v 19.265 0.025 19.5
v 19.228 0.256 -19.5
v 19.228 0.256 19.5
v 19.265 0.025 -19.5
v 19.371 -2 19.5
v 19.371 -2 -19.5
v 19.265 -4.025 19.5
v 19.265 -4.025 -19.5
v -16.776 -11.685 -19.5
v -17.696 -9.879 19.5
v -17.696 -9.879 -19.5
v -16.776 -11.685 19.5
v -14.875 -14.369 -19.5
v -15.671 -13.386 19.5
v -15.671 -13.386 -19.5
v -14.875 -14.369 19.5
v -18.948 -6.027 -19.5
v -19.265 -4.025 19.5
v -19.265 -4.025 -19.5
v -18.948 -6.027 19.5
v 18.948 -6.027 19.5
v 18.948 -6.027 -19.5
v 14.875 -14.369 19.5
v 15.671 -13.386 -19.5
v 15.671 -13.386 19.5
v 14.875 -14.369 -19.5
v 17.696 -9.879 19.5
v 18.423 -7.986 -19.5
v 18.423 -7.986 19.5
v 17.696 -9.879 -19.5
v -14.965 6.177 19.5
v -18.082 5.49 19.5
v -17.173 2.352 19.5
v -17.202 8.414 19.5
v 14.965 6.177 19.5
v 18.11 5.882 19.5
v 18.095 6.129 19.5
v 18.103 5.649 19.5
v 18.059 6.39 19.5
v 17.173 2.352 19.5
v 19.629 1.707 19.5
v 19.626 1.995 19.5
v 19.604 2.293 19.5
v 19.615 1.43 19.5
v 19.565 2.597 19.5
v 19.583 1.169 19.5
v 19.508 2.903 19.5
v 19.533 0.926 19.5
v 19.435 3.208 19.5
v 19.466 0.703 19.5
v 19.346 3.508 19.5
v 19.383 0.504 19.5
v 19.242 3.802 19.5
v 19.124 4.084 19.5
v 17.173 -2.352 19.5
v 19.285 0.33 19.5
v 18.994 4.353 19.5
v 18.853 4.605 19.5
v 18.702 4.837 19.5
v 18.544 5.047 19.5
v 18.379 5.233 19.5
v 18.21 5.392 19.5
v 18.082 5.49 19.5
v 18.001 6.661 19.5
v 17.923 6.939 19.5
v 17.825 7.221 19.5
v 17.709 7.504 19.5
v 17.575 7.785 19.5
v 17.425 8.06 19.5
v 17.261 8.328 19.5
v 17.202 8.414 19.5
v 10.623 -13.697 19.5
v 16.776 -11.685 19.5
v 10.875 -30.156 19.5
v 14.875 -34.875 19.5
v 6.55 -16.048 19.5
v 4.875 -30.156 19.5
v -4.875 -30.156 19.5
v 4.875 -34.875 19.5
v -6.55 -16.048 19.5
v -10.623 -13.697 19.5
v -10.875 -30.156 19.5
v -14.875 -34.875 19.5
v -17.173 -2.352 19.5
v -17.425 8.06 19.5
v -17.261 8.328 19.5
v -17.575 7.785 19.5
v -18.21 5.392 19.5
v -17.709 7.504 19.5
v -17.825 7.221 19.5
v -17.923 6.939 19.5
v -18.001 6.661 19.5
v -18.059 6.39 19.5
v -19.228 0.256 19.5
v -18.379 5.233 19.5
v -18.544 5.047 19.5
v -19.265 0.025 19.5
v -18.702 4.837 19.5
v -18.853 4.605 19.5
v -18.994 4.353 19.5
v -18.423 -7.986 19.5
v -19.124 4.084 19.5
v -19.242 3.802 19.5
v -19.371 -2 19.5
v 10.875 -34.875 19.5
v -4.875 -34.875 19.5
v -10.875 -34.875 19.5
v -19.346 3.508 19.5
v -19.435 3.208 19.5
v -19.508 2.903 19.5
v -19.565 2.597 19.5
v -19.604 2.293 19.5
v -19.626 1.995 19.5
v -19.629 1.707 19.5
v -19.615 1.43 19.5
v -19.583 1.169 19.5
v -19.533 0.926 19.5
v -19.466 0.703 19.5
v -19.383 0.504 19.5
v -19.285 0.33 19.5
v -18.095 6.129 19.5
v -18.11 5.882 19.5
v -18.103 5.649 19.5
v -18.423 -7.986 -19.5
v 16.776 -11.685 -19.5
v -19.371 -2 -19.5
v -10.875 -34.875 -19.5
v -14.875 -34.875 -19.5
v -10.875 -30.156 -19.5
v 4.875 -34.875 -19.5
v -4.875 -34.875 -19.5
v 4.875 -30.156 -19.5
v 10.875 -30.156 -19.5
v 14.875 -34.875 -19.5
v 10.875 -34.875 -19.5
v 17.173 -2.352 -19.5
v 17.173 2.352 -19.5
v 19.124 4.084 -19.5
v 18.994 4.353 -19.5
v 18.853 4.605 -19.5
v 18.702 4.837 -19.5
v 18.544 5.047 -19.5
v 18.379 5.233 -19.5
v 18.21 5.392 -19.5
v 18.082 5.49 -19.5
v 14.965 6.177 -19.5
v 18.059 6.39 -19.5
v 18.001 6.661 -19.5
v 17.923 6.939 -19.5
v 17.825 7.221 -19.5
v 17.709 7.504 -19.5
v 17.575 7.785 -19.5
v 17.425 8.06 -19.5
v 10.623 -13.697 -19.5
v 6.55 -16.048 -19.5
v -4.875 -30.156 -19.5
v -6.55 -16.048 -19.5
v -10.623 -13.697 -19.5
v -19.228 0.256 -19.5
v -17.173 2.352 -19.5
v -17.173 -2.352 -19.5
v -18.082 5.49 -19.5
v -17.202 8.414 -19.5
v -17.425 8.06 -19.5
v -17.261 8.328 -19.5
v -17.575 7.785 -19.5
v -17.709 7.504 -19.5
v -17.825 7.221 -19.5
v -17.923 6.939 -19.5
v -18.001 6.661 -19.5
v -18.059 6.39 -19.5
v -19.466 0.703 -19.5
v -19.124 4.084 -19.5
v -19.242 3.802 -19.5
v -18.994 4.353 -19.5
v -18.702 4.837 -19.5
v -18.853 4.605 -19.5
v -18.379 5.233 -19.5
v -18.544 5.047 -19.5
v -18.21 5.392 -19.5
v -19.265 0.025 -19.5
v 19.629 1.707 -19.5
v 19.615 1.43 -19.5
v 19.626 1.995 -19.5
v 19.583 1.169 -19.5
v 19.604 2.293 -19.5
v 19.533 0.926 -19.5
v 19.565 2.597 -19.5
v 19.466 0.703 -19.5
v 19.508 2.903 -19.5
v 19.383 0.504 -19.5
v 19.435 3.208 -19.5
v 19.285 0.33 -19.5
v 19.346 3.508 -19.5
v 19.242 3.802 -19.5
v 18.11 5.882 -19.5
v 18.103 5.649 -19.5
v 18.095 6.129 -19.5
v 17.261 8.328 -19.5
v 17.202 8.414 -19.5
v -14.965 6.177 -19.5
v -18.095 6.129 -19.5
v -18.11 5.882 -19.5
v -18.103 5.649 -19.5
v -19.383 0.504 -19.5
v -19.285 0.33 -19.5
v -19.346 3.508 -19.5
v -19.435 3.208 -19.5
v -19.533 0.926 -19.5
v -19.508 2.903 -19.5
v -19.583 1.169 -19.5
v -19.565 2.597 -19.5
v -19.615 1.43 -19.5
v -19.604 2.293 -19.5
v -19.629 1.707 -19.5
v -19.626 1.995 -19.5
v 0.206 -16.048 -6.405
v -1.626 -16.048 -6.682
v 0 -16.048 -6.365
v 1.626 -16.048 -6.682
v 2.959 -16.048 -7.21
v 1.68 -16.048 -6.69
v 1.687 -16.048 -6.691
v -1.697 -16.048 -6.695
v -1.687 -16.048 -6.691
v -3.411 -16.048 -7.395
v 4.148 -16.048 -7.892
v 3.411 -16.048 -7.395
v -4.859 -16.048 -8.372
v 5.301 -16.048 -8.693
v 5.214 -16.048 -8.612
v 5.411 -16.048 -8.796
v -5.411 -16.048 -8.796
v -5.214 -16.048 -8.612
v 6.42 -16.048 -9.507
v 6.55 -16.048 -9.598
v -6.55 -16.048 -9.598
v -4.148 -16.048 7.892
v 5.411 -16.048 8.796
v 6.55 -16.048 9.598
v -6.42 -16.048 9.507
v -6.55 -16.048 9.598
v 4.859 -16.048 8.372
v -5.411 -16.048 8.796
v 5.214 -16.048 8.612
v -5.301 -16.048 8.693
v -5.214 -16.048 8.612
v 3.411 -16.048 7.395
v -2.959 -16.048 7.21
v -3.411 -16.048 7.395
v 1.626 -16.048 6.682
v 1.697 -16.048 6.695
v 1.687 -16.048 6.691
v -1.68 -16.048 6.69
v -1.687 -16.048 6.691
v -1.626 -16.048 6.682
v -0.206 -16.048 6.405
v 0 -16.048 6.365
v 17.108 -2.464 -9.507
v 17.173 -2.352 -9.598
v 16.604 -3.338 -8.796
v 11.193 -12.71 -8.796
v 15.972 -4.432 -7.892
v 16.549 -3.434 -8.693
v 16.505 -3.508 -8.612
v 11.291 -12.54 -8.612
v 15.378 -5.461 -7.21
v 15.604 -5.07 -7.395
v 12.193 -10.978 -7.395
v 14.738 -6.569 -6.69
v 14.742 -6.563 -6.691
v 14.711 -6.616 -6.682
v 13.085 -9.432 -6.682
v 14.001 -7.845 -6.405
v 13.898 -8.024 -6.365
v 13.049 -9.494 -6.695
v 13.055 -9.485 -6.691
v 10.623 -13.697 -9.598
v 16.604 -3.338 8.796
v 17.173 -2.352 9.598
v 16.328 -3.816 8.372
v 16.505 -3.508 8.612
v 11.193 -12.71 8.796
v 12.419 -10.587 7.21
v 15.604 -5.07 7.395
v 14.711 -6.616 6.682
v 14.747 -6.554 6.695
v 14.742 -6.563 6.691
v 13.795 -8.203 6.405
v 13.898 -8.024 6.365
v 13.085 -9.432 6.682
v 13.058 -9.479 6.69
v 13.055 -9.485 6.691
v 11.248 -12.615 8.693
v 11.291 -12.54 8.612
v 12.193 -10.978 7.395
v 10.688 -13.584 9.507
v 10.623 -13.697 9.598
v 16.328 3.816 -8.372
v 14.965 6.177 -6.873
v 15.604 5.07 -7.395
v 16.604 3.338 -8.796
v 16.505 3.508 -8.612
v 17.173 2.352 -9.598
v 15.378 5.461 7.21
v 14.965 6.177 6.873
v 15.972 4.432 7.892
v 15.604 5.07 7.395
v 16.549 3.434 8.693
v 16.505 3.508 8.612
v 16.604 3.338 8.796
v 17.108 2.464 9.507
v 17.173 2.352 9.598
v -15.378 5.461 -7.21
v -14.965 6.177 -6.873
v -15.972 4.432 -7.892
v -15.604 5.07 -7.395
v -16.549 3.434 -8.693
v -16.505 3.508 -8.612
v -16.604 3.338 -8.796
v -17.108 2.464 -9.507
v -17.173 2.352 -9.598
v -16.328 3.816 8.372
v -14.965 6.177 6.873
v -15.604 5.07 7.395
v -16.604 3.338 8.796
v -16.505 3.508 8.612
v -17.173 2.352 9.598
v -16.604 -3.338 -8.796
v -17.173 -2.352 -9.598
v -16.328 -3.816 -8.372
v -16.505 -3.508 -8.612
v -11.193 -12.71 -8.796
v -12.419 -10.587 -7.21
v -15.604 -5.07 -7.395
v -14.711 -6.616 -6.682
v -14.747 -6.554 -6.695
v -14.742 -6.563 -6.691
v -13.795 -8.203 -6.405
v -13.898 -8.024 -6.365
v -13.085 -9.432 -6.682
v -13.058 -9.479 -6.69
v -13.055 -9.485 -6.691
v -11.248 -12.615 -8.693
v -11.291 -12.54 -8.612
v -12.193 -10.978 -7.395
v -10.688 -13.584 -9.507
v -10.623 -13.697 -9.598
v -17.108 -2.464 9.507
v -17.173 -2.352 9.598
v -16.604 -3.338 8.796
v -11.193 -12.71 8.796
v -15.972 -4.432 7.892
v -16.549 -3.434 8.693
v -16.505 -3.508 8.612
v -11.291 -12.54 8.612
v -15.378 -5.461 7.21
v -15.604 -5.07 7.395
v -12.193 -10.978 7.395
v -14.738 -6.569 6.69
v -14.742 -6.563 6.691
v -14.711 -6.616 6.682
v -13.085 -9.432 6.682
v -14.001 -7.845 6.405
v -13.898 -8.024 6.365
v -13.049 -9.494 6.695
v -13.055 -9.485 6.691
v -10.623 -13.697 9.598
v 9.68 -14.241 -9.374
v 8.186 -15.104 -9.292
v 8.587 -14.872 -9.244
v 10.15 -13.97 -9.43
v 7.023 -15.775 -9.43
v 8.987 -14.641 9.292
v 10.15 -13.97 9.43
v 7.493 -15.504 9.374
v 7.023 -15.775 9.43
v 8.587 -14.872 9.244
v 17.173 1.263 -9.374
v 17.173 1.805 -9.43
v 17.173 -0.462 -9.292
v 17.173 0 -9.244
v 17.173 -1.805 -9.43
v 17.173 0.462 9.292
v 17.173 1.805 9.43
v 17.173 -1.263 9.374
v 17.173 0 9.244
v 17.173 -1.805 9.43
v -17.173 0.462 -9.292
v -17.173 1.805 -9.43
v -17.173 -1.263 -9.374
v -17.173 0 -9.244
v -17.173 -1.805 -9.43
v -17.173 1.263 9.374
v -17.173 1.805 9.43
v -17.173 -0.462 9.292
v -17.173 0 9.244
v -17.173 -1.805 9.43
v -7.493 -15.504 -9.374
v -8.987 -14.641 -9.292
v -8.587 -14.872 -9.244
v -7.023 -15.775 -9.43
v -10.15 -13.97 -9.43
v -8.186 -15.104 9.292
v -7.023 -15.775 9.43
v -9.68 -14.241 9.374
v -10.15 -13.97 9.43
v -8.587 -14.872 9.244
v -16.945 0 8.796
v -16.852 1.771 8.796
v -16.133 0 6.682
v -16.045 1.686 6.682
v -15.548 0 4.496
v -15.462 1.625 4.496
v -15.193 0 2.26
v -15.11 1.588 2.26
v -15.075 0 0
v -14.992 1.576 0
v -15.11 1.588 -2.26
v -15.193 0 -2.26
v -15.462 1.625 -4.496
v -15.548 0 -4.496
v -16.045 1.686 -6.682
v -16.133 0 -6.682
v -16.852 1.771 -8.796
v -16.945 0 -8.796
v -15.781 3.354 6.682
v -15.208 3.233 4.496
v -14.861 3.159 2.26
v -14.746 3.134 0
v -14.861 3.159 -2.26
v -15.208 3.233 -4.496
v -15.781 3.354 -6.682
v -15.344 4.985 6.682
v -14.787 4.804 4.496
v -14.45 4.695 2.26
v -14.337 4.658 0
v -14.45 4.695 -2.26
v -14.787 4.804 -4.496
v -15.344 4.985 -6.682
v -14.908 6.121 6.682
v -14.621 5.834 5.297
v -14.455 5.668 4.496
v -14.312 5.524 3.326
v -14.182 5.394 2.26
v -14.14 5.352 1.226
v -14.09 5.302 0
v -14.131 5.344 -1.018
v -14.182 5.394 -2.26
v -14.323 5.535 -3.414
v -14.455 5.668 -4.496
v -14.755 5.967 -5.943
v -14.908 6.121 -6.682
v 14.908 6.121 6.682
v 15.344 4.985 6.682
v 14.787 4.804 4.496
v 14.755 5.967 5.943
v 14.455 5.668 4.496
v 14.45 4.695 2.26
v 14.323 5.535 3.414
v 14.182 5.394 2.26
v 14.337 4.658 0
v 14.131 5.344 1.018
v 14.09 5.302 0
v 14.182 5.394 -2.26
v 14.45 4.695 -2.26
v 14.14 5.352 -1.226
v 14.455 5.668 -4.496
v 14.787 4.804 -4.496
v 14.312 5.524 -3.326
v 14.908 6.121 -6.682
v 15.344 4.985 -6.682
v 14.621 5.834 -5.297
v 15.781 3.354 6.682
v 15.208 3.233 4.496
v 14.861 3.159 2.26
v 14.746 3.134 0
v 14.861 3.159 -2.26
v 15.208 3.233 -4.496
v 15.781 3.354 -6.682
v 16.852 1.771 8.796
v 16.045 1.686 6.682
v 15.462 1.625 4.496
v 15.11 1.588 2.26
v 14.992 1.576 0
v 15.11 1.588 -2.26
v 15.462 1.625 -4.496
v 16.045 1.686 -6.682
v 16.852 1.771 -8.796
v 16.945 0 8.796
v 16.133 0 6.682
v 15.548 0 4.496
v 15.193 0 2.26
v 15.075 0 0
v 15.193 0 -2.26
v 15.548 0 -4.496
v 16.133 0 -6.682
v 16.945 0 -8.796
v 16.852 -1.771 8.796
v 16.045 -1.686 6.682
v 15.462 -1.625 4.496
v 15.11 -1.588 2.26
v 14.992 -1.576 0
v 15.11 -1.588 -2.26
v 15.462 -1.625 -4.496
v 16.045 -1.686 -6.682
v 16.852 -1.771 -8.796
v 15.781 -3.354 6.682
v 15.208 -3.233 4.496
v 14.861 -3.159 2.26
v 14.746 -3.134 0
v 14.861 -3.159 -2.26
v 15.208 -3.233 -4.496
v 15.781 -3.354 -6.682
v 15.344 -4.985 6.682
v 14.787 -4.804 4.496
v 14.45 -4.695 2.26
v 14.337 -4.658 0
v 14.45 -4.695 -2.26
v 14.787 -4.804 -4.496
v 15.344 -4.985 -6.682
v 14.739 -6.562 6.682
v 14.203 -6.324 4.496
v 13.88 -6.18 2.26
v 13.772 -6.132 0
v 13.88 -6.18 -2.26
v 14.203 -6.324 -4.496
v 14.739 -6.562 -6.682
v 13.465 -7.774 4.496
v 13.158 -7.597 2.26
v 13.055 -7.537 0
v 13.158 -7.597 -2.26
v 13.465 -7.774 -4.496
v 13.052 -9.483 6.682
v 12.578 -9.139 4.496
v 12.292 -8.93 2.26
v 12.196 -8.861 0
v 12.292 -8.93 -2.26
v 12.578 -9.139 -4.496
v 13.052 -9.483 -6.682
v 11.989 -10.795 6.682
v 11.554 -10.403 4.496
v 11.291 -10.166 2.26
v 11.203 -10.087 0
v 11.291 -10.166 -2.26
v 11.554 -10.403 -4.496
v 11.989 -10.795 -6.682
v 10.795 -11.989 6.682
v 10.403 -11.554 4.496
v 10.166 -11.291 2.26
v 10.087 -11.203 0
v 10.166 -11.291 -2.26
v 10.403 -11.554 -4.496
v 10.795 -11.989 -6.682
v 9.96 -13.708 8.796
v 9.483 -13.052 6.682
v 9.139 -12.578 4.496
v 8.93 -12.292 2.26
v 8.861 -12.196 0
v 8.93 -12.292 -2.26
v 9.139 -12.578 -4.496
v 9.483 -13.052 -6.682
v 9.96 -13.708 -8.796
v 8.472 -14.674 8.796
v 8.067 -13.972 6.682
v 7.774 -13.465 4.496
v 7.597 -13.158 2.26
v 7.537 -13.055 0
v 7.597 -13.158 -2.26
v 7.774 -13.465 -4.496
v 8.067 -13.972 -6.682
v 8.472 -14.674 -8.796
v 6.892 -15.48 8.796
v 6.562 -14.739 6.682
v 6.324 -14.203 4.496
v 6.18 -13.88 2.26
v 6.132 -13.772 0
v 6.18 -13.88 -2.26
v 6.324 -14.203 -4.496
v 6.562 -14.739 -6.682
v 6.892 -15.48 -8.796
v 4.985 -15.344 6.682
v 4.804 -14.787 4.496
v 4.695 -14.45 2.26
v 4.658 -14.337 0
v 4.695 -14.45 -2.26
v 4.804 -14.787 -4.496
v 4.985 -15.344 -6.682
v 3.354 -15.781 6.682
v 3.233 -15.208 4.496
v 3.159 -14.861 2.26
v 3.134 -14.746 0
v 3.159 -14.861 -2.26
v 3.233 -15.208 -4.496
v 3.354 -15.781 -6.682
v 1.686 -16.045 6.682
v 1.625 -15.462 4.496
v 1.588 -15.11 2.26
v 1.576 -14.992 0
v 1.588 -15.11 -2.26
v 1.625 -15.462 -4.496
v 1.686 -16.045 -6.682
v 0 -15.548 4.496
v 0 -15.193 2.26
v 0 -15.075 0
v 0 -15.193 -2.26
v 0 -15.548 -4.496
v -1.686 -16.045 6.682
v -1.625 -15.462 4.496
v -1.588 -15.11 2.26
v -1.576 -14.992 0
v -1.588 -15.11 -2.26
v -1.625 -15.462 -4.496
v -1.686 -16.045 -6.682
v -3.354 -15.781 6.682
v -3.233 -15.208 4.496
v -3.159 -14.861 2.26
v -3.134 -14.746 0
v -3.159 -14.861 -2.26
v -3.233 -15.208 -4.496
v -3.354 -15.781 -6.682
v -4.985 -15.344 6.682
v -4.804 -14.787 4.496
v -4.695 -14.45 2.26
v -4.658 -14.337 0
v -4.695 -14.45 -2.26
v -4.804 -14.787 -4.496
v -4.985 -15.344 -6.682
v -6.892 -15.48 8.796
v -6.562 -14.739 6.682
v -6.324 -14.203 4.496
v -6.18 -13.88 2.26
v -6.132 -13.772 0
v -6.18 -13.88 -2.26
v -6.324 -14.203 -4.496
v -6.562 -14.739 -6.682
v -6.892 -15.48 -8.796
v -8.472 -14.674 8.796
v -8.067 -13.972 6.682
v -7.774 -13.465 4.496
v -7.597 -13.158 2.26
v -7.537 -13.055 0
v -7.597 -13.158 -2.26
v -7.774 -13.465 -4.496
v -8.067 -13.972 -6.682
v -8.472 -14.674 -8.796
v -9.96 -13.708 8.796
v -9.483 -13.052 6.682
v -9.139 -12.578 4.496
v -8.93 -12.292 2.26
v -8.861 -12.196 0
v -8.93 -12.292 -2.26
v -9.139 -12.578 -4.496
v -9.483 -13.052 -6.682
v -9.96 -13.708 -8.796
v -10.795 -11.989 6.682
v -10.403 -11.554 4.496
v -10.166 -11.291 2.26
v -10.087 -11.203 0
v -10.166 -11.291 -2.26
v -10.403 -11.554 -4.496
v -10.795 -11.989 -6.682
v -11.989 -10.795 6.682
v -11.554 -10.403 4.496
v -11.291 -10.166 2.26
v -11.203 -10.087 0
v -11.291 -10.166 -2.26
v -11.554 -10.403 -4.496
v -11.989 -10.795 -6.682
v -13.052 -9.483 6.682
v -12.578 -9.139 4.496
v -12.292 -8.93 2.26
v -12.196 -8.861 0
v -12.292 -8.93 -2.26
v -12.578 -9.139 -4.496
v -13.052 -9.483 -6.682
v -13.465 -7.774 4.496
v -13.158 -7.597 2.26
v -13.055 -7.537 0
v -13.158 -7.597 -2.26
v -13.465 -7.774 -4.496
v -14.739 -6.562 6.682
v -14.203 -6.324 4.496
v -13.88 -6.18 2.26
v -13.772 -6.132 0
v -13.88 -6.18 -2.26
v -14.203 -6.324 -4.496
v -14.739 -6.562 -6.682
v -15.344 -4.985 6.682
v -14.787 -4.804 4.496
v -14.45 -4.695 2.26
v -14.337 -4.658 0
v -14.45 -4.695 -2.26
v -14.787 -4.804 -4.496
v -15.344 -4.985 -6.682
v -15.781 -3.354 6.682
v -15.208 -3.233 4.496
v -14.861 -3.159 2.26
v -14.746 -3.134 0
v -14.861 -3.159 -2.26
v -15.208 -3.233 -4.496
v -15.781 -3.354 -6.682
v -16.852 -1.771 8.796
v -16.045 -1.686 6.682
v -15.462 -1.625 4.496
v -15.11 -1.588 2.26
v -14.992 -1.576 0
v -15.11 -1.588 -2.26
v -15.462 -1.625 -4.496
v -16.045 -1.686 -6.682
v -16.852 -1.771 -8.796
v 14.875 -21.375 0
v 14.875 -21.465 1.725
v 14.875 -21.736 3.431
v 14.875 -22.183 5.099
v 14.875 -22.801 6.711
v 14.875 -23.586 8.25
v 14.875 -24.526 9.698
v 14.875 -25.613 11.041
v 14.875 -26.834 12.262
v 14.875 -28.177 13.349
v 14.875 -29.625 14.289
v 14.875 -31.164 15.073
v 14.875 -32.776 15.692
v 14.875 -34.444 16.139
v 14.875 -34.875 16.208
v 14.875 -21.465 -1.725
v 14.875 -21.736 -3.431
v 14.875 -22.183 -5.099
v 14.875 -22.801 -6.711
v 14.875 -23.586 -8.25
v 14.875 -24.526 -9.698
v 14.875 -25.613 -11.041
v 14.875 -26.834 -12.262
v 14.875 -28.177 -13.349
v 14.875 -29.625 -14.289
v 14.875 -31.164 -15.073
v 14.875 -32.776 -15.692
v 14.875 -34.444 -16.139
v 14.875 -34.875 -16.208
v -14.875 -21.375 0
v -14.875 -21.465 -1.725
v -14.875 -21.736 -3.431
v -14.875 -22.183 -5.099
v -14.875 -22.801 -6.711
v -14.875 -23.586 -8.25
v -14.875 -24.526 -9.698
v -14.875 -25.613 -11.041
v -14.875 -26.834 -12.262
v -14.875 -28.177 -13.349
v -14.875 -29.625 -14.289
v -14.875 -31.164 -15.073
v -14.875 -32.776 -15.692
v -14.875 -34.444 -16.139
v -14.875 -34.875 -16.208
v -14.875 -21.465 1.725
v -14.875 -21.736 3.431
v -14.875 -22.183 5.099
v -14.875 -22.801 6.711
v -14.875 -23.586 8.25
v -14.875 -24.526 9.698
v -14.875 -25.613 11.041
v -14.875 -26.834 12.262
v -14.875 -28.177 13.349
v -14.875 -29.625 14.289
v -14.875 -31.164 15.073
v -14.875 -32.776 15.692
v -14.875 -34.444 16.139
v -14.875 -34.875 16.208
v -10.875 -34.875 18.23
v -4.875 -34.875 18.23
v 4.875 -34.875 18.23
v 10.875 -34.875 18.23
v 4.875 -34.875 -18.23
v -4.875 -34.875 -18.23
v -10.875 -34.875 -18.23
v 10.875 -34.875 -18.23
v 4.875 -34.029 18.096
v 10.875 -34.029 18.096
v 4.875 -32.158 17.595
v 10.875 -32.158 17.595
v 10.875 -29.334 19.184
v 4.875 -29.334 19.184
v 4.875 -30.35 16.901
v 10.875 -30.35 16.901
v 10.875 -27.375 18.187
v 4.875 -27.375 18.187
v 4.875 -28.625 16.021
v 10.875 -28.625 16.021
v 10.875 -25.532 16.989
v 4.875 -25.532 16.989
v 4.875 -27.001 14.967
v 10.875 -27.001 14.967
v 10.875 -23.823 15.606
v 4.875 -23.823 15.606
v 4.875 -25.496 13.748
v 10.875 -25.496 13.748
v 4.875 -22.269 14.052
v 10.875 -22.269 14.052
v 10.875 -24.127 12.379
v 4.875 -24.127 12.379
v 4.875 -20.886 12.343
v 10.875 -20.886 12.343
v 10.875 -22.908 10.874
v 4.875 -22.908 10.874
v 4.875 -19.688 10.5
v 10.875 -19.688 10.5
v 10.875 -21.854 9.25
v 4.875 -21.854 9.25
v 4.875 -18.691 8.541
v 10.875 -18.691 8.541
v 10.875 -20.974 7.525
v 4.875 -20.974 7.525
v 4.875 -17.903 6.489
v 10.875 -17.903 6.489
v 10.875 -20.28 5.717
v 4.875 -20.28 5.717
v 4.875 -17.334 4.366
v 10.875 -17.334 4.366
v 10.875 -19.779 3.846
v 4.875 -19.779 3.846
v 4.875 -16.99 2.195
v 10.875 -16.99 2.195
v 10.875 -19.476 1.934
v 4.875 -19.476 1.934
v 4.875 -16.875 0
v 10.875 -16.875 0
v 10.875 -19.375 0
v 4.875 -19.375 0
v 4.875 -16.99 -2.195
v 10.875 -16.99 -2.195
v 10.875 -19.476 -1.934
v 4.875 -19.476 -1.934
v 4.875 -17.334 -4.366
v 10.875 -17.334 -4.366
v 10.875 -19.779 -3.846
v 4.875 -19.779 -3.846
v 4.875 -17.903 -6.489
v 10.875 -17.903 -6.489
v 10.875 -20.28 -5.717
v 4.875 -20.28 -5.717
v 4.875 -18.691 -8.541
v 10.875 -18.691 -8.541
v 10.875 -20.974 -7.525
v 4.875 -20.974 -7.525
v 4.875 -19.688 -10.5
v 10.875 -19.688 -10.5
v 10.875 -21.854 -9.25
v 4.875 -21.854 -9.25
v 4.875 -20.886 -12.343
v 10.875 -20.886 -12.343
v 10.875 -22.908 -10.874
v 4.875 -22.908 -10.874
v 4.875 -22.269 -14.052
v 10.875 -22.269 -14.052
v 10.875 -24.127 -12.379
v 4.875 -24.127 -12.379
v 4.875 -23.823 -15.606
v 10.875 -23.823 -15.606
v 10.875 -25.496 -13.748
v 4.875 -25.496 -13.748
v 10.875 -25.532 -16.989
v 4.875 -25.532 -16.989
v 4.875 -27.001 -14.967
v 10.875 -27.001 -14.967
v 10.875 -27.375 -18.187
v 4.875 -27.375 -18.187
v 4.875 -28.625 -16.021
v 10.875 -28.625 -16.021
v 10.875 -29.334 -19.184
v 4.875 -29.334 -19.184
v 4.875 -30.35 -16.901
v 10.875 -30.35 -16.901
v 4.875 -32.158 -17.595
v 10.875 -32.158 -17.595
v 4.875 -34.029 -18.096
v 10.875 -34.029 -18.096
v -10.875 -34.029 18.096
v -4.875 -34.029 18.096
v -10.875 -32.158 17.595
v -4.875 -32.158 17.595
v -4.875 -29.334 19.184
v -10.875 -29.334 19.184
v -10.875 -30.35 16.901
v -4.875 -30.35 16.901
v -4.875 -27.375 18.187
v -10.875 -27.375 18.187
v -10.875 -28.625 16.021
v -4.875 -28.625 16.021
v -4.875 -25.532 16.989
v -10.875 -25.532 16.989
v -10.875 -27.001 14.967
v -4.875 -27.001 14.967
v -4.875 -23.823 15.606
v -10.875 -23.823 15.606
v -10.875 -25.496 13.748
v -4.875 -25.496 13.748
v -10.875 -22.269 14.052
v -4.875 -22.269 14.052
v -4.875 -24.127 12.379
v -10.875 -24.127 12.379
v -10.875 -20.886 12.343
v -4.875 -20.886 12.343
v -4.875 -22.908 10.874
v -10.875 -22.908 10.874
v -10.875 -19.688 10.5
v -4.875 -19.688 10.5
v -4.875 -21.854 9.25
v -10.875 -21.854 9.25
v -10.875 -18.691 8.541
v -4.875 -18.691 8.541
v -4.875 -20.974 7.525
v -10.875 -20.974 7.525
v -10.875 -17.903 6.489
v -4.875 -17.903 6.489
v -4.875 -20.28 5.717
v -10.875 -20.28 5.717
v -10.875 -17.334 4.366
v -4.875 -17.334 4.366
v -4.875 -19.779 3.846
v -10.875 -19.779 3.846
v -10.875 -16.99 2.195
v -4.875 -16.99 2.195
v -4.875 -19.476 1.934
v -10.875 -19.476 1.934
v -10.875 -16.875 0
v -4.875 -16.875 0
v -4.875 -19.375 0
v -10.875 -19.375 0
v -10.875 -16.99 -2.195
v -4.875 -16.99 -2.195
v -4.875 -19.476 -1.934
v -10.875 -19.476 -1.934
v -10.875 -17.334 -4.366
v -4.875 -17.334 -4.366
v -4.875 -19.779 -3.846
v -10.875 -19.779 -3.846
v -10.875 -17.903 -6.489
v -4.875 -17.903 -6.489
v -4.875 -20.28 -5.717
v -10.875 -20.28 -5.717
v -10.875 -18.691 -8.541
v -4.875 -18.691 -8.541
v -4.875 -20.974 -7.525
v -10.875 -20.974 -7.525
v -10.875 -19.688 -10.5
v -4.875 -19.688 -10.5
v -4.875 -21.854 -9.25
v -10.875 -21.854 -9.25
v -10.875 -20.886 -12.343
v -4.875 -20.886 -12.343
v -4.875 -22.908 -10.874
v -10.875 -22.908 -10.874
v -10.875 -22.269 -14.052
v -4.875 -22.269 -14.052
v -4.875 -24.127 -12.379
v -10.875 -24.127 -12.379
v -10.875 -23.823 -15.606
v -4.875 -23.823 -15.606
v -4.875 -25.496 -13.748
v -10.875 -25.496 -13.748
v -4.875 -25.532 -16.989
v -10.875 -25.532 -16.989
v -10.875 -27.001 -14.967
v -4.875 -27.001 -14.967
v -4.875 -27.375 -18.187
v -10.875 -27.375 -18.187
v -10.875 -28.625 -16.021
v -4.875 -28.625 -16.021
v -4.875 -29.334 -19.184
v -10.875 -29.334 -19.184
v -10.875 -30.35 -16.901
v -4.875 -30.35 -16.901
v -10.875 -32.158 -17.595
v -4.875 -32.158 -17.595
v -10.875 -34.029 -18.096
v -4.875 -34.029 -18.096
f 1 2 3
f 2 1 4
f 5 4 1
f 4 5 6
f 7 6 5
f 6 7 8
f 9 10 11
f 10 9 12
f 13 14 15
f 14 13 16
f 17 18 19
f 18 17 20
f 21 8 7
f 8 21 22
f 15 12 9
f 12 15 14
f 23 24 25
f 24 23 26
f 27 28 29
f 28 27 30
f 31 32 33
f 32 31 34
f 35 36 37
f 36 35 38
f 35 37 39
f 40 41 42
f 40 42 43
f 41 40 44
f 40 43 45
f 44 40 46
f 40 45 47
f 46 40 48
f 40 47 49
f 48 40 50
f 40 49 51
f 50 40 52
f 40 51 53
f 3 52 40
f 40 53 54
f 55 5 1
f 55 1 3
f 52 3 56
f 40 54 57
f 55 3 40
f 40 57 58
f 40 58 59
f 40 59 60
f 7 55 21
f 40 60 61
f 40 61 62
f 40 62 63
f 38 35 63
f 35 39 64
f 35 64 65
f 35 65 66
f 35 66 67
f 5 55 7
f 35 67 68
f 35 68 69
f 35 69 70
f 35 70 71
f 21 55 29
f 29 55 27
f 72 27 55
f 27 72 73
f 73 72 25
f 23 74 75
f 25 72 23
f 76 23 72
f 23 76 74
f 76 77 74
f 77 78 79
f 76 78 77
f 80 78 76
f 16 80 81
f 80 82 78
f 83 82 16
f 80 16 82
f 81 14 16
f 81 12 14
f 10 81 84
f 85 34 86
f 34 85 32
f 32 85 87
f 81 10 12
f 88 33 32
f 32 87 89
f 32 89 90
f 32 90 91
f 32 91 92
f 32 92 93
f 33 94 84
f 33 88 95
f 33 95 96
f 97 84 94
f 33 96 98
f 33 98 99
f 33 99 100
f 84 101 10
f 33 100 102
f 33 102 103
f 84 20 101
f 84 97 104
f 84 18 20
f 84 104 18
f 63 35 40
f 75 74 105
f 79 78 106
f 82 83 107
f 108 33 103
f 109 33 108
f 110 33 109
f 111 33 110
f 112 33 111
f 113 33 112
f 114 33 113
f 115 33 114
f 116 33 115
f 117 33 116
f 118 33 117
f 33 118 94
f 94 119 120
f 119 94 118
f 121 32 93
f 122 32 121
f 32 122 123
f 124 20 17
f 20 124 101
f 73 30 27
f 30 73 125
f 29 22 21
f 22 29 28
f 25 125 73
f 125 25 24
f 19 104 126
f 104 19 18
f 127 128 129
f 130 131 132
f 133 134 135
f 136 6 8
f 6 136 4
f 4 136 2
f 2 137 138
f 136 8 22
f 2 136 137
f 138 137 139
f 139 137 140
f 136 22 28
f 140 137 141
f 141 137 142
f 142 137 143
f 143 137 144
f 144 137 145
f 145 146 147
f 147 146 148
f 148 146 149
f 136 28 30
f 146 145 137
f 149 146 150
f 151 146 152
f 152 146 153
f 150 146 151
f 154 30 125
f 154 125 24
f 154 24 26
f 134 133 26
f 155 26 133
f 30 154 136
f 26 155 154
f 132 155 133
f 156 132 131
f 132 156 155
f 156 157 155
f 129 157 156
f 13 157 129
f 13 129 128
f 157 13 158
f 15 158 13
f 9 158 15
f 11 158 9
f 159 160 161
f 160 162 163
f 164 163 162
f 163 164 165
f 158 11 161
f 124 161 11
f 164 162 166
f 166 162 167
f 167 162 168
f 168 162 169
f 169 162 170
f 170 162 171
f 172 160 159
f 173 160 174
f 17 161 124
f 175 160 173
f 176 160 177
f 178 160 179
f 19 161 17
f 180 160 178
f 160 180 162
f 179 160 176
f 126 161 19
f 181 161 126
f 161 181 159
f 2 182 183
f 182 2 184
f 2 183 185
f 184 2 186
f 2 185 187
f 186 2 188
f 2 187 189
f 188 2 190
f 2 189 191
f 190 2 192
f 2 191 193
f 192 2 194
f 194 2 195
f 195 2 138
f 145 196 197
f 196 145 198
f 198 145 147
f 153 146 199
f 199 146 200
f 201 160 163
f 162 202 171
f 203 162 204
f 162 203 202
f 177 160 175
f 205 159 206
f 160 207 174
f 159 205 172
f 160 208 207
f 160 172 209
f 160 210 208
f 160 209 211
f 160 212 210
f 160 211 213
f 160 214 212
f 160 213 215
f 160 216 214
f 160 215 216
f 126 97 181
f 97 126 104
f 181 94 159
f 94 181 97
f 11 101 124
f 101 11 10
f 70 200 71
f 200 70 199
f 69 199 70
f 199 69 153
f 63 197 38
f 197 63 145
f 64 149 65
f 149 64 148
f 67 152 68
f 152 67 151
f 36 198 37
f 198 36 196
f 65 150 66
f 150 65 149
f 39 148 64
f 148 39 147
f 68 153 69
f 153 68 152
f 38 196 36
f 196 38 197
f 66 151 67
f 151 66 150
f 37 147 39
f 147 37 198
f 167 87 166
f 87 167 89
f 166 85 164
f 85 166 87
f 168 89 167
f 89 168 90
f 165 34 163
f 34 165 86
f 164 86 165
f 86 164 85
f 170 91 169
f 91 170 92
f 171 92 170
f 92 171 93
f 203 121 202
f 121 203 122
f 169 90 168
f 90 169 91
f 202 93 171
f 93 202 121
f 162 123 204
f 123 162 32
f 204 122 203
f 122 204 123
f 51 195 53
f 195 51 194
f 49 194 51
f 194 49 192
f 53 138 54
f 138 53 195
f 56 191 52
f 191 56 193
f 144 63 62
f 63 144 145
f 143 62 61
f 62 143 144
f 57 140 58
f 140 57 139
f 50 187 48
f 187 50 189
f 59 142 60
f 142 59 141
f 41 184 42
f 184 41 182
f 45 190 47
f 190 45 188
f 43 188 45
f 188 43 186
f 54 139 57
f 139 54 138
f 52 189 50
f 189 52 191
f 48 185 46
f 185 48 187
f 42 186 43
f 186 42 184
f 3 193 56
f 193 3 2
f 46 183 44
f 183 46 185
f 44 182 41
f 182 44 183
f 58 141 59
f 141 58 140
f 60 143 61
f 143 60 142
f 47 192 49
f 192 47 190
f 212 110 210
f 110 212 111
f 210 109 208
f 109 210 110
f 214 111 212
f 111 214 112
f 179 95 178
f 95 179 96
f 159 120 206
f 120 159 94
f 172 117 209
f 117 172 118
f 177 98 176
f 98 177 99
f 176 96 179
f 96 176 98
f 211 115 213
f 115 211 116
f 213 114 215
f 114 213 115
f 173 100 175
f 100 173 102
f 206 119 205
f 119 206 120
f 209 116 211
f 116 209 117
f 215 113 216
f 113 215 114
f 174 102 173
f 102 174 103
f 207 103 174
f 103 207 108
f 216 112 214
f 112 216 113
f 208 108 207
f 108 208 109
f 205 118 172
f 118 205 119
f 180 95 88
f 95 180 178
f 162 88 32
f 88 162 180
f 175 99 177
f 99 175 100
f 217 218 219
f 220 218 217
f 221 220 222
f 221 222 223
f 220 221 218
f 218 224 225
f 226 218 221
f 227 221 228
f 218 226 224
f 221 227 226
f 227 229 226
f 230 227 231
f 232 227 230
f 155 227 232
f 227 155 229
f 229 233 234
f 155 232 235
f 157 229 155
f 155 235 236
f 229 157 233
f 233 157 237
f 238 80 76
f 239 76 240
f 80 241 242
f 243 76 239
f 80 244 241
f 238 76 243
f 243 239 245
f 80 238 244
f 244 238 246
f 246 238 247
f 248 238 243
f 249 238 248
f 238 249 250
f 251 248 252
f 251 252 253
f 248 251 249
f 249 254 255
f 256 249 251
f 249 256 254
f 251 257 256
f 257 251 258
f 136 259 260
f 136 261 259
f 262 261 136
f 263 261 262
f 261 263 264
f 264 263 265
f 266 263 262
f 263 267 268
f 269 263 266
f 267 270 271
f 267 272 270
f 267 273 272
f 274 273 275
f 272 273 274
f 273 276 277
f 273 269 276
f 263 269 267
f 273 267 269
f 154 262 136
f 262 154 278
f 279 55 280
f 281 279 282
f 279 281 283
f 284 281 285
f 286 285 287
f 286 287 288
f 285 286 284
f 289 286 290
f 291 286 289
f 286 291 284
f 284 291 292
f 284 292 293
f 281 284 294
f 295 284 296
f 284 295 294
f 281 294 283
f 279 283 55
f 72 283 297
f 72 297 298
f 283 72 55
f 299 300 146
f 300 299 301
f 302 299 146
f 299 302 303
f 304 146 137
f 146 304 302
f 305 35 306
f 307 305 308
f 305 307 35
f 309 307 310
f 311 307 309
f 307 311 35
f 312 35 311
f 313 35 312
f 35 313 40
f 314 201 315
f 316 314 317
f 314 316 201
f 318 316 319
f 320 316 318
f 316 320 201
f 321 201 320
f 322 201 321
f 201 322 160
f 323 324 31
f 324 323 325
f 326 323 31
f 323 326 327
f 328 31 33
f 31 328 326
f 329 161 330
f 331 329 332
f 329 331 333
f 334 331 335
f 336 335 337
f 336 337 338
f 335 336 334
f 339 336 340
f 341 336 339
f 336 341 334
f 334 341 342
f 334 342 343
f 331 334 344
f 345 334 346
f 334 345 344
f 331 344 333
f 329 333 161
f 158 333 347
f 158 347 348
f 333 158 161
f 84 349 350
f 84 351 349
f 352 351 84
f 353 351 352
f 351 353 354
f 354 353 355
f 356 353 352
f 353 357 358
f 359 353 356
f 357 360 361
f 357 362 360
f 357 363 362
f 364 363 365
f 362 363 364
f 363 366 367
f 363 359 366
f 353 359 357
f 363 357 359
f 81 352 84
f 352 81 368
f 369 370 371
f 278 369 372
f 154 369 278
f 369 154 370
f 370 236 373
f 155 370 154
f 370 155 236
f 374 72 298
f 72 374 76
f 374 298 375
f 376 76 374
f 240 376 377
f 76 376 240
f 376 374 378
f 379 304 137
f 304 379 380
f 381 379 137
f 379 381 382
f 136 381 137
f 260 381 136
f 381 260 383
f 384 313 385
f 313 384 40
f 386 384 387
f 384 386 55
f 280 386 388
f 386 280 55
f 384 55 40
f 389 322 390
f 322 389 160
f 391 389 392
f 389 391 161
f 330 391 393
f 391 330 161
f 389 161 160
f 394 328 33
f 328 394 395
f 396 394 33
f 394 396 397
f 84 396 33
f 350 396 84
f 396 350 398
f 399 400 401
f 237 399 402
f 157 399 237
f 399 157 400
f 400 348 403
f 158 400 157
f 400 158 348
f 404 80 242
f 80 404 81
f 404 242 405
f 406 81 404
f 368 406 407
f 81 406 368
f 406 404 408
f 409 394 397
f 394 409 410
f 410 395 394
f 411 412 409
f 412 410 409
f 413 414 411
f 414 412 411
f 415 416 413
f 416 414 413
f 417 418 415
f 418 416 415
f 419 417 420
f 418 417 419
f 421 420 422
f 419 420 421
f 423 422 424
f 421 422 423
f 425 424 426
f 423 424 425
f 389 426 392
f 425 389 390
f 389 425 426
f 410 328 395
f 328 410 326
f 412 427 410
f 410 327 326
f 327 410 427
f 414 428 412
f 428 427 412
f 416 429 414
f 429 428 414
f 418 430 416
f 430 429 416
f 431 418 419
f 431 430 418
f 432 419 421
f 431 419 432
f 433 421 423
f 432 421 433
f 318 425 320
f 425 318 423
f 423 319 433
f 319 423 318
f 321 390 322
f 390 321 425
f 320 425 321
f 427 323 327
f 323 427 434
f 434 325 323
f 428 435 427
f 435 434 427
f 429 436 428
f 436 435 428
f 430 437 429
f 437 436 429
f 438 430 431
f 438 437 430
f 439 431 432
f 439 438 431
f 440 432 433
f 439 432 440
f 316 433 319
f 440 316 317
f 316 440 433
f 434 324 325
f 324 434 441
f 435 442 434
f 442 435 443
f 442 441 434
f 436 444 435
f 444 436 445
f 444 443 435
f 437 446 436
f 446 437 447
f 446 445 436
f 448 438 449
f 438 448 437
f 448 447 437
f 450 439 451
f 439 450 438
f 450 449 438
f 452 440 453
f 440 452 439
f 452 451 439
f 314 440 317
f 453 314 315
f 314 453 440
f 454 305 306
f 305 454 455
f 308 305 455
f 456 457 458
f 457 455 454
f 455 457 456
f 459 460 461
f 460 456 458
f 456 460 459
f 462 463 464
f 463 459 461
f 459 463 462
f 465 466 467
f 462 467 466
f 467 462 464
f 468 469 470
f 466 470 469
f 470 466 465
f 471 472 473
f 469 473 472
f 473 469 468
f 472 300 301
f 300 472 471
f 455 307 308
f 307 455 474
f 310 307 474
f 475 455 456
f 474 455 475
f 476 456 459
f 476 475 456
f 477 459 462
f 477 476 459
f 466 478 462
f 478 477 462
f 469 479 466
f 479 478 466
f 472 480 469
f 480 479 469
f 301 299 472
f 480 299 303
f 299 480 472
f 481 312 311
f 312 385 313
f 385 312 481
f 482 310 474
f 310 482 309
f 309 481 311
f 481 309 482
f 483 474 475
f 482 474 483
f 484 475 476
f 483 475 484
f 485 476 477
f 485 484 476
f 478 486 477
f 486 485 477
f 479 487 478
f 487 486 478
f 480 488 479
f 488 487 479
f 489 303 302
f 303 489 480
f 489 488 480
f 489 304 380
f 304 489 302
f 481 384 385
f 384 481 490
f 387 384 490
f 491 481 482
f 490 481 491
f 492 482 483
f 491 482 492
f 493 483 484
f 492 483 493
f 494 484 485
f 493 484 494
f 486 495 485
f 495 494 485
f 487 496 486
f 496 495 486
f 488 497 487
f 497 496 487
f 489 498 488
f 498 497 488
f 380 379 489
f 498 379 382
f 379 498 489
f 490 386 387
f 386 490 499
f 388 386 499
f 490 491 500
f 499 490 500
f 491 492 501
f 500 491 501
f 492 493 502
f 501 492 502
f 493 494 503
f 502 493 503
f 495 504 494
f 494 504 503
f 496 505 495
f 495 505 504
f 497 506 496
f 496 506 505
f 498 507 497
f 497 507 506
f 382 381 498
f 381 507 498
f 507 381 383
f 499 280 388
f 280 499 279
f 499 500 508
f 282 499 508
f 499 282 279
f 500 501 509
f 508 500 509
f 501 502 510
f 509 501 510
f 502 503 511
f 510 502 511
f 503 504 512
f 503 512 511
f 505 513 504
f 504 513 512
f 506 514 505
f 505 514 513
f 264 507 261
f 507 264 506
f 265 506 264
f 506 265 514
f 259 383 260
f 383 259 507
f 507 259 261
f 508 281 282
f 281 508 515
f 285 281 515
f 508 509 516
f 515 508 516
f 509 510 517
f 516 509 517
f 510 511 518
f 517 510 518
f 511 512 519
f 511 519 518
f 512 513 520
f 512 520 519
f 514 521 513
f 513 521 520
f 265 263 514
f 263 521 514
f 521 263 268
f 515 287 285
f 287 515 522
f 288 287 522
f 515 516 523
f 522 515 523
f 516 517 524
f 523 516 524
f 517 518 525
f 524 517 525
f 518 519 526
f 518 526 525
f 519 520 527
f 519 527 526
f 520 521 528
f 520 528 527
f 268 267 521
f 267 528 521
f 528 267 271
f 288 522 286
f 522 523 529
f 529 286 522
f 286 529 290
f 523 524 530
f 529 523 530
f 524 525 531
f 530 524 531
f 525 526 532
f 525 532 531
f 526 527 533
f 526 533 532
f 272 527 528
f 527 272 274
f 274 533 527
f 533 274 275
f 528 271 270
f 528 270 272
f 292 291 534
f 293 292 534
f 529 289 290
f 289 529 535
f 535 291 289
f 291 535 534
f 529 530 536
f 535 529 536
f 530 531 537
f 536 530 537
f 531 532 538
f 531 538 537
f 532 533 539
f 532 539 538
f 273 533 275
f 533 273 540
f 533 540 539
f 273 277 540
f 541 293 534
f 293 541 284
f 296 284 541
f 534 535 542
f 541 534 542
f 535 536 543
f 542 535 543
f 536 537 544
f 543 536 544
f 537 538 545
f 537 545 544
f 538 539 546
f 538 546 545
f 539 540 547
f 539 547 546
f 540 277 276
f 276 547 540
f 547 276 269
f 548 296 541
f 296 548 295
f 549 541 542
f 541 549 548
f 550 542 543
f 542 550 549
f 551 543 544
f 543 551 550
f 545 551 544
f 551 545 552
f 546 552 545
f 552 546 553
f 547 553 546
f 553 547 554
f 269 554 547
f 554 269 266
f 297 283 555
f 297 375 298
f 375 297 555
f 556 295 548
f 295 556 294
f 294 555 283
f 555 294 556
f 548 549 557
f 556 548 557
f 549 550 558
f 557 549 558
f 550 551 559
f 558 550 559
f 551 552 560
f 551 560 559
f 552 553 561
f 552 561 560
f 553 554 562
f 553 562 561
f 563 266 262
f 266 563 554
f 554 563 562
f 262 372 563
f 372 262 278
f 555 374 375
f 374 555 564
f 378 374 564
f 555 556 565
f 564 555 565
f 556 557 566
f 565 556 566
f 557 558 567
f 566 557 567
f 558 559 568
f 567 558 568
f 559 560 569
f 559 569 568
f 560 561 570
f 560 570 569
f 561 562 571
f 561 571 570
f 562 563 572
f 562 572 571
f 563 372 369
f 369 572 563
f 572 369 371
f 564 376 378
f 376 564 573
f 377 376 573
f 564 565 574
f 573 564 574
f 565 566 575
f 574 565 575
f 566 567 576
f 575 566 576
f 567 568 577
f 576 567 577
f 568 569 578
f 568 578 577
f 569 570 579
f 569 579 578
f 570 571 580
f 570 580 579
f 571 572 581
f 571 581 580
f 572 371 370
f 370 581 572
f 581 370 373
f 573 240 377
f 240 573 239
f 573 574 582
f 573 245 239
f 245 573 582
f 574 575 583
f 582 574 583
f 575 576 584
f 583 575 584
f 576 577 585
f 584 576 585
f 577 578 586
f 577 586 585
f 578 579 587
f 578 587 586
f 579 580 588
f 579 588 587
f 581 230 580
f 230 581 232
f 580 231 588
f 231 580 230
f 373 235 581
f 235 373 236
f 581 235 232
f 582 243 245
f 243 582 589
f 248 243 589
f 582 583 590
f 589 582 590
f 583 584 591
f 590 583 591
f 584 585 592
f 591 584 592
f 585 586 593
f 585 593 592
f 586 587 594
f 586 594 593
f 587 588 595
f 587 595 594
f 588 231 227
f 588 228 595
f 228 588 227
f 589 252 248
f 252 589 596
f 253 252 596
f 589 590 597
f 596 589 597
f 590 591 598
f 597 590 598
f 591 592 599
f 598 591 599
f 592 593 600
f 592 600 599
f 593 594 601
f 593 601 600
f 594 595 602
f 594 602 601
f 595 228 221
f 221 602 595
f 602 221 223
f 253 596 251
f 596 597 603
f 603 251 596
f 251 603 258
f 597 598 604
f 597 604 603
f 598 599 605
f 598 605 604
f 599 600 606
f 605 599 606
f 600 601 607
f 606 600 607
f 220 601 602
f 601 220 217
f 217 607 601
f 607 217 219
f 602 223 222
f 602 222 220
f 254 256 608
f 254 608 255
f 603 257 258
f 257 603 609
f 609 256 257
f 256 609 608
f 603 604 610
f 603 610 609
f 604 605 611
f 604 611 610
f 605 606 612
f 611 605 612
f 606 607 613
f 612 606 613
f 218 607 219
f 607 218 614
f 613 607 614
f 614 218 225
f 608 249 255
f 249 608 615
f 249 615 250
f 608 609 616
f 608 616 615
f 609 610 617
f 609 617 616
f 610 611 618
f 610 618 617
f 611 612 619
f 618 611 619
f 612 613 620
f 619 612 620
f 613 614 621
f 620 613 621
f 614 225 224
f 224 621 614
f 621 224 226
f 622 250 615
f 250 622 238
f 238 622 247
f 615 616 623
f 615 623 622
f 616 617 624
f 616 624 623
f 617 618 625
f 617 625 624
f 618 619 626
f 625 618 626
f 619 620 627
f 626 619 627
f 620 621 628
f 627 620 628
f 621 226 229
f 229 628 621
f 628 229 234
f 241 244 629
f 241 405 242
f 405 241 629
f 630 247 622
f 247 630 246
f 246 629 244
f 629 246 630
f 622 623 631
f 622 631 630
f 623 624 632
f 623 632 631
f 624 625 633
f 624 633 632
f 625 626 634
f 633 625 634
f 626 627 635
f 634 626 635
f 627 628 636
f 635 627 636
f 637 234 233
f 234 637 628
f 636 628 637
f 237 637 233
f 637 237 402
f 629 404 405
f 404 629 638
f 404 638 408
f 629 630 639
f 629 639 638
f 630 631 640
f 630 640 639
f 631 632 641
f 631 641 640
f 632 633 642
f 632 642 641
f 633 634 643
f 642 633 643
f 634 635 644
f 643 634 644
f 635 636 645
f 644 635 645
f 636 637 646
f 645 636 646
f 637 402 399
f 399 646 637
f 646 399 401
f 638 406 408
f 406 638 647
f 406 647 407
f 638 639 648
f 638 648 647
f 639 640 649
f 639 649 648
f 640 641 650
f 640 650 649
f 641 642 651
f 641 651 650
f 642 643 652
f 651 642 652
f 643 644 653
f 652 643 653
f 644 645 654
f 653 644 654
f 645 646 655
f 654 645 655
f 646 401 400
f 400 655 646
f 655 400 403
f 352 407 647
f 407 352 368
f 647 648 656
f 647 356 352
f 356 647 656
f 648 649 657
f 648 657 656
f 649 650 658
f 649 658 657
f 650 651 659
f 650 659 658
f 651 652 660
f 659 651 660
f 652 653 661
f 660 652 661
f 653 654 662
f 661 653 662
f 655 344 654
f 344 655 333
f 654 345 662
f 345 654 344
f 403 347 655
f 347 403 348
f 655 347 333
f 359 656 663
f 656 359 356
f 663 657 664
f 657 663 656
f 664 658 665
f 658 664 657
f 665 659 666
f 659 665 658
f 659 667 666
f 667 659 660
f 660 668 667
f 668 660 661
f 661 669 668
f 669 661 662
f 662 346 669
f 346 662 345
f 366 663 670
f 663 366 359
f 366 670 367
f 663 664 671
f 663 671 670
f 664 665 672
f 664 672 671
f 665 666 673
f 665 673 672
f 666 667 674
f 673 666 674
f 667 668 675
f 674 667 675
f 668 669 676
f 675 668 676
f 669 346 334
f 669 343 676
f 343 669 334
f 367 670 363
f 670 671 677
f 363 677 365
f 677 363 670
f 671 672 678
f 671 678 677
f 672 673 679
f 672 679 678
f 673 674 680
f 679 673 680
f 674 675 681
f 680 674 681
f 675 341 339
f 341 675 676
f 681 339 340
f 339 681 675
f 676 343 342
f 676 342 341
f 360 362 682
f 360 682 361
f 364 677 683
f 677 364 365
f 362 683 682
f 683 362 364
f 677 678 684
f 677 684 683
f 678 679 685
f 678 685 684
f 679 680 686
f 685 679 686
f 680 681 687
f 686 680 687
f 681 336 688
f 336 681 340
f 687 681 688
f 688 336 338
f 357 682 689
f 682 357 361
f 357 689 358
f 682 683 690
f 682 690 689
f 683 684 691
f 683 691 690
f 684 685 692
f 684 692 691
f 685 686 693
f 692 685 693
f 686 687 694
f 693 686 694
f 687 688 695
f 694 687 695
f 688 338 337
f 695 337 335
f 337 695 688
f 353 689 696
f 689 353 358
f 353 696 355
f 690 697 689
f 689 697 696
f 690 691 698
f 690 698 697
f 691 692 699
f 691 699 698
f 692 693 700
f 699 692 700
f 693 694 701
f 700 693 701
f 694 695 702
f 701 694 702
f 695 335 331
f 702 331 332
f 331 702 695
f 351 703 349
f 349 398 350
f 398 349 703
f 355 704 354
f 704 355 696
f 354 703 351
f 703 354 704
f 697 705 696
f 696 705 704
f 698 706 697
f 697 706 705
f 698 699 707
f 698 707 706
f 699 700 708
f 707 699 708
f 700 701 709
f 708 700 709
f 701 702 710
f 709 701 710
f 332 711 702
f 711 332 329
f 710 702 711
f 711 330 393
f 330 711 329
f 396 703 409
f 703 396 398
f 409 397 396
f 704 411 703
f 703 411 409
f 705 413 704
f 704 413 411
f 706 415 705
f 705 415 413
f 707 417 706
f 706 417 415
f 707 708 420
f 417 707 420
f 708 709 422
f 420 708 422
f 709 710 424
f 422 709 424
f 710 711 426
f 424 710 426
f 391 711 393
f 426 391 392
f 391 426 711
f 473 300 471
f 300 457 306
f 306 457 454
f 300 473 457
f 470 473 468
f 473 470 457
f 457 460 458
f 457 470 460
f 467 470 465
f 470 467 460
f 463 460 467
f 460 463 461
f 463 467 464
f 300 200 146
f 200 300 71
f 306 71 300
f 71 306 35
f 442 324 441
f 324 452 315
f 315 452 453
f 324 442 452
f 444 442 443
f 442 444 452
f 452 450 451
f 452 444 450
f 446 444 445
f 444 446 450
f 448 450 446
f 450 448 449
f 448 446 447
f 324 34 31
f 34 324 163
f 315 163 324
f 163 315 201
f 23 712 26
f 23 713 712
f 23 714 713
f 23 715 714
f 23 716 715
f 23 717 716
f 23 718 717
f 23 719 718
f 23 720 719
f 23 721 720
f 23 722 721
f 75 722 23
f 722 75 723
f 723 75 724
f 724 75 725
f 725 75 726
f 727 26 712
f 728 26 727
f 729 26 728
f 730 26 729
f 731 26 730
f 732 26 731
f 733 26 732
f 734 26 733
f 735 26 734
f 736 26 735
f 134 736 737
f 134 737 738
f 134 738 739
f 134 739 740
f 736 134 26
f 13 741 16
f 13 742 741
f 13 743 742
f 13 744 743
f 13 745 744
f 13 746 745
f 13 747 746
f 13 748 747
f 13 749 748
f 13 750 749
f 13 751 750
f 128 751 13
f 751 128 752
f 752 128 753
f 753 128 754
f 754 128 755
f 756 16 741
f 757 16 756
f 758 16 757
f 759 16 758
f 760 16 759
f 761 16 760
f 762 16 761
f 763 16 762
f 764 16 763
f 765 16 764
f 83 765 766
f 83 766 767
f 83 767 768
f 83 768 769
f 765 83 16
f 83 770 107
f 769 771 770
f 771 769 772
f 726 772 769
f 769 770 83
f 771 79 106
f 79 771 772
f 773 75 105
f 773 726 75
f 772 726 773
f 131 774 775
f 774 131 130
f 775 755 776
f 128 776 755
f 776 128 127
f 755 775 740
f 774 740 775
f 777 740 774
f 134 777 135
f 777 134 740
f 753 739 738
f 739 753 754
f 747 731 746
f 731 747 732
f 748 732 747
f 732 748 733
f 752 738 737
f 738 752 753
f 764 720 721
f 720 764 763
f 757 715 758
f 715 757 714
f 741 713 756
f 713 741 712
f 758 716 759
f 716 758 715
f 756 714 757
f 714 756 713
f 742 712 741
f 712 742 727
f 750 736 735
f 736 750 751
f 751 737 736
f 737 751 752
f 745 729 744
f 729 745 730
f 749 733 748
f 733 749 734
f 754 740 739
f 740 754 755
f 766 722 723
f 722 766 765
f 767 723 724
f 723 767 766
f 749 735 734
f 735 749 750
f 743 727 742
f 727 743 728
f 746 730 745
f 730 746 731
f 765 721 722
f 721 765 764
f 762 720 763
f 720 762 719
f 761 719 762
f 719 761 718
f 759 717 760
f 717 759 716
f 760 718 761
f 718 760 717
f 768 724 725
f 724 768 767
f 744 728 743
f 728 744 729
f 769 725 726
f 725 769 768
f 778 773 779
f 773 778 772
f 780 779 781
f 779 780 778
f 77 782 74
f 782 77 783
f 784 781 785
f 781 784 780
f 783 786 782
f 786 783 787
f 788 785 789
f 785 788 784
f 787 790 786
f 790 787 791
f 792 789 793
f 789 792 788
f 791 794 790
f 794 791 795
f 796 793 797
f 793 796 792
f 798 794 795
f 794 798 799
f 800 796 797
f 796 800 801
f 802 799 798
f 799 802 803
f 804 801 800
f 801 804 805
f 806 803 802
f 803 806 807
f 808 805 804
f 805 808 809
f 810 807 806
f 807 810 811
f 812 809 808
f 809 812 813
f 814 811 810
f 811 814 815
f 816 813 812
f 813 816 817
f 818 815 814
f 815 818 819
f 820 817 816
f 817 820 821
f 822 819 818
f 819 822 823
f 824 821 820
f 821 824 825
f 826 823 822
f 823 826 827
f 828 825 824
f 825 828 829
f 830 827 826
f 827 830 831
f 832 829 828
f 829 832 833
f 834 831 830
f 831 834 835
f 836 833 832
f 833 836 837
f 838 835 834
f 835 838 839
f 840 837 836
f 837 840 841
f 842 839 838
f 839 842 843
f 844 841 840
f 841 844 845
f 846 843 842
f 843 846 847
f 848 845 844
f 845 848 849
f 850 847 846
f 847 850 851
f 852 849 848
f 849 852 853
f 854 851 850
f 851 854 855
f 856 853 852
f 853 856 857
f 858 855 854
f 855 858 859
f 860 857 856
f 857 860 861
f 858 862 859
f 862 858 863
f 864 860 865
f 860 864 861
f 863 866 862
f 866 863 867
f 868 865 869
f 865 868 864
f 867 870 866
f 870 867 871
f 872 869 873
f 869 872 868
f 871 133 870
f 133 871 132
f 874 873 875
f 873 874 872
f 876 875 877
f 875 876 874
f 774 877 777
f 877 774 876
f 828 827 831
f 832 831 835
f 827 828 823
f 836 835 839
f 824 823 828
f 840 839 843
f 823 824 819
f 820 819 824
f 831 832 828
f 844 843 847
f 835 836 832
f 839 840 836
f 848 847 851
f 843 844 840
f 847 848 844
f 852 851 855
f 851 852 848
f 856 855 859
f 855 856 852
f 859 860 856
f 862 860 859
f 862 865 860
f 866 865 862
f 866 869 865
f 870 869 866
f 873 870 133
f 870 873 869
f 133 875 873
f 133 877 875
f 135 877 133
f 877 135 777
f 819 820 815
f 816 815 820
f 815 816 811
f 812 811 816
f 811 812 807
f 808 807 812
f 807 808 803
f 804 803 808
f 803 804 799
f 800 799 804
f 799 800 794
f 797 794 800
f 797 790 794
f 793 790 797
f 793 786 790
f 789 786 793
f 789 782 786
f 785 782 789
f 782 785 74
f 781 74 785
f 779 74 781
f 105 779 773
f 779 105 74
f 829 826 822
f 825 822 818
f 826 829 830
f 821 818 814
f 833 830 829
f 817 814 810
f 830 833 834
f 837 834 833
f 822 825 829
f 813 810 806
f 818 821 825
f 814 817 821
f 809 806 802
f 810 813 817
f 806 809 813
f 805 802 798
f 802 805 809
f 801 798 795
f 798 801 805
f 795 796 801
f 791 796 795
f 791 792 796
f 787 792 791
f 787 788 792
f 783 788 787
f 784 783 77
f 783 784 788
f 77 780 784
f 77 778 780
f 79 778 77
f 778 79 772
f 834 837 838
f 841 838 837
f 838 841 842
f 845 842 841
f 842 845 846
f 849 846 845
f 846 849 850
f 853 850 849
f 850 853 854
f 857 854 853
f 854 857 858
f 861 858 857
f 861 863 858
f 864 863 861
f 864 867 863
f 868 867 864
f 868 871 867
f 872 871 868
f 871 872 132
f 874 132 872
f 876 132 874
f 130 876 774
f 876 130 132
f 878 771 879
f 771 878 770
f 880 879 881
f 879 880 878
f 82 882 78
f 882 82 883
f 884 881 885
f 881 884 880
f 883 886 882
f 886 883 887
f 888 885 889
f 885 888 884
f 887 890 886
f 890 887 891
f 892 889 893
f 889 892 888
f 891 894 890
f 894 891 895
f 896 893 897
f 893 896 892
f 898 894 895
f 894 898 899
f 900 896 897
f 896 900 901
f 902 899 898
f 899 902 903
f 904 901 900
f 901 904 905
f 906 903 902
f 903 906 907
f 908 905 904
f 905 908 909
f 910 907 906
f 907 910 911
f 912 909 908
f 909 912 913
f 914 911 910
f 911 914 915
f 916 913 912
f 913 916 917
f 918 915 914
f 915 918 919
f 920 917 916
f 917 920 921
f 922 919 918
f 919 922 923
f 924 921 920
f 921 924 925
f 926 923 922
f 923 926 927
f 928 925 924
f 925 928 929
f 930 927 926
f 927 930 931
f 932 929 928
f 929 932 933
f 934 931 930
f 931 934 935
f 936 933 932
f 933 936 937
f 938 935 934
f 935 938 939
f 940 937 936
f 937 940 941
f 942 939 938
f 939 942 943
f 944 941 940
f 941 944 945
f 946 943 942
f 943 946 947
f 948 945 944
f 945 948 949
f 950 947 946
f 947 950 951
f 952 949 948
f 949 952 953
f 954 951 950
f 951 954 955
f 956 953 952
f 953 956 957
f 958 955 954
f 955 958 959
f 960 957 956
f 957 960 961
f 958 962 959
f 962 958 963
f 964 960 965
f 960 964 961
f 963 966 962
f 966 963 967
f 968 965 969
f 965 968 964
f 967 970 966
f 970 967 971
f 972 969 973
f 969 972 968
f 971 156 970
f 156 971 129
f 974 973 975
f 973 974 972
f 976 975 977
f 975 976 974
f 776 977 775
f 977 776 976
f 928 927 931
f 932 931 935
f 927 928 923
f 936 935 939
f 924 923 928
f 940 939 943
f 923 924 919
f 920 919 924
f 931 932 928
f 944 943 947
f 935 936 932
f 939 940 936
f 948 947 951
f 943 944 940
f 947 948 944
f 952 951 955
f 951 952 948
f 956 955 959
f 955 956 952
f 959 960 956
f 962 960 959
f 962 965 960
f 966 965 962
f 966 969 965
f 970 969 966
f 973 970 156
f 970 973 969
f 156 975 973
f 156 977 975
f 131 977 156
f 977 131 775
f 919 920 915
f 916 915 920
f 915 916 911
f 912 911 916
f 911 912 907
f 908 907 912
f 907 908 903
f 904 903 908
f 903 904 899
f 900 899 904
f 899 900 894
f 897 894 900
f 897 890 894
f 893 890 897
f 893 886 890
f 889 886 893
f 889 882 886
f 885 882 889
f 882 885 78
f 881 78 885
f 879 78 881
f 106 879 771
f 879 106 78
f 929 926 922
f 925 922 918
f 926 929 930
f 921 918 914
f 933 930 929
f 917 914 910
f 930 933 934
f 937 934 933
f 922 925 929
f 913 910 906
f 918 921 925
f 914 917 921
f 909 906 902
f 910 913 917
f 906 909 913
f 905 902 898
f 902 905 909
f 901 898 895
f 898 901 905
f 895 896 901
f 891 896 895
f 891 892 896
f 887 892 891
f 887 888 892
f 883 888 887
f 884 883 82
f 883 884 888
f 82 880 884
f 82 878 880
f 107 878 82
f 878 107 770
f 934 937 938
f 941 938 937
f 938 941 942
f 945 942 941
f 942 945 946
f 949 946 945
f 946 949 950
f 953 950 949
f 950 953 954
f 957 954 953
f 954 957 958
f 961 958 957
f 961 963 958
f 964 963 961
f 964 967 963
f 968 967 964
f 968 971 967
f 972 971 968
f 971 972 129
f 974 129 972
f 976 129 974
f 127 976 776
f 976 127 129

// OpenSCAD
handlebarDiameter = 32;
fudj = 0.2;
mmIn = 25.4 * 1;
hexlightFlatDistance = 1.25 * mmIn;
handlebarD = handlebarDiameter + 0.8 + fudj; // inner tube is .8mm thick
len = handlebarD + 6;
$fn = 60;

apothem = hexlightFlatDistance/2;
circumradius = apothem/cos(180/6) + fudj;

apothemminor = 34/2;
circumradiusminor = apothemminor/cos(180/6) + fudj;

sagitta = 1 + 0;
chordy = 13 + 0;
cutoutR = (chordy*chordy)/(8*sagitta) + sagitta/2;

addedThickness = 0.42 * 2;

difference() {
	union() {
		hexMount();
		handlebarMount();
	}
	#zipCutouts();
}

module hexMount() {
	difference() {
		outer();
		hexBrightBody();
		cutout();
	}
}

yOffset = -handlebarD/2 - hexlightFlatDistance/2 - 0.5;

module handlebarMount() {
	difference() {
		translate([-(hexlightFlatDistance-2)/2, yOffset - 2, -len/2])
			cube(size=[hexlightFlatDistance-2, handlebarD, len], center=false);
		translate([0,yOffset - 5,0])
			rotate([0,90,0]) cylinder(r=handlebarD/2, h=len, center=true);
		hexBrightBody();
	}
}

module zipCutouts() {
	translate([hexlightFlatDistance/2 - 8,0,0]) zipCutout();
	translate([-(hexlightFlatDistance/2 - 8),0,0]) zipCutout();
}
module zipCutout() {
	translate([0,yOffset - 5,0])
	rotate([0,90,0])
	rotate_extrude()
	translate([handlebarD/2 + 1.25 + 2, 0, 0])
		square(size=[2.5, 6], center=true);
}

module hexBrightBody() {
	// translate([0,0,10]) cube(size=[hexlightFlatDistance, hexlightFlatDistance, hexlightFlatDistance], center=true);
	// translate([0,0,10]) cube(size=[34, 34, 34], center=true);
	difference() {
		intersection() {
			cylinder(r=circumradius, h=len+1, center=true, $fn=6);
			rotate([0,0,360/12]) cylinder(r=circumradiusminor, h=len+2, center=true, $fn=6);
		}
		hexBrightBodyFillet();
	}
}
module hexBrightBodyFillet() {
	intersection() {
		rotate_extrude($fn=60)
			translate([cutoutR + hexlightFlatDistance/2 + fudj - sagitta,0,0])
				circle(r=cutoutR); 
		outer();
	}
}
outerYOff = -2;
module outer() {
	translate([0,outerYOff,0]) cylinder(r=circumradius + addedThickness, h=len, center=true);
	rib(30);
	rib(180-30);
	rib(15);
	rib(180-15);
}

module rib(angle) {
	r = 1.5;
	translate([
		(circumradius+addedThickness-r/2) * cos(angle), 
		(circumradius+addedThickness-r/2) * sin(angle) + outerYOff,
		0
	]) 
		rotate([0,0,angle])
		scale([1,2,1])
		cylinder(r=r, h=len, center=true);
}


module cutout() {
	translate([0, hexlightFlatDistance/3, 0]) 
		cylinder(r=circumradius + addedThickness, h=len+3, center=true, $fn=4);

}
